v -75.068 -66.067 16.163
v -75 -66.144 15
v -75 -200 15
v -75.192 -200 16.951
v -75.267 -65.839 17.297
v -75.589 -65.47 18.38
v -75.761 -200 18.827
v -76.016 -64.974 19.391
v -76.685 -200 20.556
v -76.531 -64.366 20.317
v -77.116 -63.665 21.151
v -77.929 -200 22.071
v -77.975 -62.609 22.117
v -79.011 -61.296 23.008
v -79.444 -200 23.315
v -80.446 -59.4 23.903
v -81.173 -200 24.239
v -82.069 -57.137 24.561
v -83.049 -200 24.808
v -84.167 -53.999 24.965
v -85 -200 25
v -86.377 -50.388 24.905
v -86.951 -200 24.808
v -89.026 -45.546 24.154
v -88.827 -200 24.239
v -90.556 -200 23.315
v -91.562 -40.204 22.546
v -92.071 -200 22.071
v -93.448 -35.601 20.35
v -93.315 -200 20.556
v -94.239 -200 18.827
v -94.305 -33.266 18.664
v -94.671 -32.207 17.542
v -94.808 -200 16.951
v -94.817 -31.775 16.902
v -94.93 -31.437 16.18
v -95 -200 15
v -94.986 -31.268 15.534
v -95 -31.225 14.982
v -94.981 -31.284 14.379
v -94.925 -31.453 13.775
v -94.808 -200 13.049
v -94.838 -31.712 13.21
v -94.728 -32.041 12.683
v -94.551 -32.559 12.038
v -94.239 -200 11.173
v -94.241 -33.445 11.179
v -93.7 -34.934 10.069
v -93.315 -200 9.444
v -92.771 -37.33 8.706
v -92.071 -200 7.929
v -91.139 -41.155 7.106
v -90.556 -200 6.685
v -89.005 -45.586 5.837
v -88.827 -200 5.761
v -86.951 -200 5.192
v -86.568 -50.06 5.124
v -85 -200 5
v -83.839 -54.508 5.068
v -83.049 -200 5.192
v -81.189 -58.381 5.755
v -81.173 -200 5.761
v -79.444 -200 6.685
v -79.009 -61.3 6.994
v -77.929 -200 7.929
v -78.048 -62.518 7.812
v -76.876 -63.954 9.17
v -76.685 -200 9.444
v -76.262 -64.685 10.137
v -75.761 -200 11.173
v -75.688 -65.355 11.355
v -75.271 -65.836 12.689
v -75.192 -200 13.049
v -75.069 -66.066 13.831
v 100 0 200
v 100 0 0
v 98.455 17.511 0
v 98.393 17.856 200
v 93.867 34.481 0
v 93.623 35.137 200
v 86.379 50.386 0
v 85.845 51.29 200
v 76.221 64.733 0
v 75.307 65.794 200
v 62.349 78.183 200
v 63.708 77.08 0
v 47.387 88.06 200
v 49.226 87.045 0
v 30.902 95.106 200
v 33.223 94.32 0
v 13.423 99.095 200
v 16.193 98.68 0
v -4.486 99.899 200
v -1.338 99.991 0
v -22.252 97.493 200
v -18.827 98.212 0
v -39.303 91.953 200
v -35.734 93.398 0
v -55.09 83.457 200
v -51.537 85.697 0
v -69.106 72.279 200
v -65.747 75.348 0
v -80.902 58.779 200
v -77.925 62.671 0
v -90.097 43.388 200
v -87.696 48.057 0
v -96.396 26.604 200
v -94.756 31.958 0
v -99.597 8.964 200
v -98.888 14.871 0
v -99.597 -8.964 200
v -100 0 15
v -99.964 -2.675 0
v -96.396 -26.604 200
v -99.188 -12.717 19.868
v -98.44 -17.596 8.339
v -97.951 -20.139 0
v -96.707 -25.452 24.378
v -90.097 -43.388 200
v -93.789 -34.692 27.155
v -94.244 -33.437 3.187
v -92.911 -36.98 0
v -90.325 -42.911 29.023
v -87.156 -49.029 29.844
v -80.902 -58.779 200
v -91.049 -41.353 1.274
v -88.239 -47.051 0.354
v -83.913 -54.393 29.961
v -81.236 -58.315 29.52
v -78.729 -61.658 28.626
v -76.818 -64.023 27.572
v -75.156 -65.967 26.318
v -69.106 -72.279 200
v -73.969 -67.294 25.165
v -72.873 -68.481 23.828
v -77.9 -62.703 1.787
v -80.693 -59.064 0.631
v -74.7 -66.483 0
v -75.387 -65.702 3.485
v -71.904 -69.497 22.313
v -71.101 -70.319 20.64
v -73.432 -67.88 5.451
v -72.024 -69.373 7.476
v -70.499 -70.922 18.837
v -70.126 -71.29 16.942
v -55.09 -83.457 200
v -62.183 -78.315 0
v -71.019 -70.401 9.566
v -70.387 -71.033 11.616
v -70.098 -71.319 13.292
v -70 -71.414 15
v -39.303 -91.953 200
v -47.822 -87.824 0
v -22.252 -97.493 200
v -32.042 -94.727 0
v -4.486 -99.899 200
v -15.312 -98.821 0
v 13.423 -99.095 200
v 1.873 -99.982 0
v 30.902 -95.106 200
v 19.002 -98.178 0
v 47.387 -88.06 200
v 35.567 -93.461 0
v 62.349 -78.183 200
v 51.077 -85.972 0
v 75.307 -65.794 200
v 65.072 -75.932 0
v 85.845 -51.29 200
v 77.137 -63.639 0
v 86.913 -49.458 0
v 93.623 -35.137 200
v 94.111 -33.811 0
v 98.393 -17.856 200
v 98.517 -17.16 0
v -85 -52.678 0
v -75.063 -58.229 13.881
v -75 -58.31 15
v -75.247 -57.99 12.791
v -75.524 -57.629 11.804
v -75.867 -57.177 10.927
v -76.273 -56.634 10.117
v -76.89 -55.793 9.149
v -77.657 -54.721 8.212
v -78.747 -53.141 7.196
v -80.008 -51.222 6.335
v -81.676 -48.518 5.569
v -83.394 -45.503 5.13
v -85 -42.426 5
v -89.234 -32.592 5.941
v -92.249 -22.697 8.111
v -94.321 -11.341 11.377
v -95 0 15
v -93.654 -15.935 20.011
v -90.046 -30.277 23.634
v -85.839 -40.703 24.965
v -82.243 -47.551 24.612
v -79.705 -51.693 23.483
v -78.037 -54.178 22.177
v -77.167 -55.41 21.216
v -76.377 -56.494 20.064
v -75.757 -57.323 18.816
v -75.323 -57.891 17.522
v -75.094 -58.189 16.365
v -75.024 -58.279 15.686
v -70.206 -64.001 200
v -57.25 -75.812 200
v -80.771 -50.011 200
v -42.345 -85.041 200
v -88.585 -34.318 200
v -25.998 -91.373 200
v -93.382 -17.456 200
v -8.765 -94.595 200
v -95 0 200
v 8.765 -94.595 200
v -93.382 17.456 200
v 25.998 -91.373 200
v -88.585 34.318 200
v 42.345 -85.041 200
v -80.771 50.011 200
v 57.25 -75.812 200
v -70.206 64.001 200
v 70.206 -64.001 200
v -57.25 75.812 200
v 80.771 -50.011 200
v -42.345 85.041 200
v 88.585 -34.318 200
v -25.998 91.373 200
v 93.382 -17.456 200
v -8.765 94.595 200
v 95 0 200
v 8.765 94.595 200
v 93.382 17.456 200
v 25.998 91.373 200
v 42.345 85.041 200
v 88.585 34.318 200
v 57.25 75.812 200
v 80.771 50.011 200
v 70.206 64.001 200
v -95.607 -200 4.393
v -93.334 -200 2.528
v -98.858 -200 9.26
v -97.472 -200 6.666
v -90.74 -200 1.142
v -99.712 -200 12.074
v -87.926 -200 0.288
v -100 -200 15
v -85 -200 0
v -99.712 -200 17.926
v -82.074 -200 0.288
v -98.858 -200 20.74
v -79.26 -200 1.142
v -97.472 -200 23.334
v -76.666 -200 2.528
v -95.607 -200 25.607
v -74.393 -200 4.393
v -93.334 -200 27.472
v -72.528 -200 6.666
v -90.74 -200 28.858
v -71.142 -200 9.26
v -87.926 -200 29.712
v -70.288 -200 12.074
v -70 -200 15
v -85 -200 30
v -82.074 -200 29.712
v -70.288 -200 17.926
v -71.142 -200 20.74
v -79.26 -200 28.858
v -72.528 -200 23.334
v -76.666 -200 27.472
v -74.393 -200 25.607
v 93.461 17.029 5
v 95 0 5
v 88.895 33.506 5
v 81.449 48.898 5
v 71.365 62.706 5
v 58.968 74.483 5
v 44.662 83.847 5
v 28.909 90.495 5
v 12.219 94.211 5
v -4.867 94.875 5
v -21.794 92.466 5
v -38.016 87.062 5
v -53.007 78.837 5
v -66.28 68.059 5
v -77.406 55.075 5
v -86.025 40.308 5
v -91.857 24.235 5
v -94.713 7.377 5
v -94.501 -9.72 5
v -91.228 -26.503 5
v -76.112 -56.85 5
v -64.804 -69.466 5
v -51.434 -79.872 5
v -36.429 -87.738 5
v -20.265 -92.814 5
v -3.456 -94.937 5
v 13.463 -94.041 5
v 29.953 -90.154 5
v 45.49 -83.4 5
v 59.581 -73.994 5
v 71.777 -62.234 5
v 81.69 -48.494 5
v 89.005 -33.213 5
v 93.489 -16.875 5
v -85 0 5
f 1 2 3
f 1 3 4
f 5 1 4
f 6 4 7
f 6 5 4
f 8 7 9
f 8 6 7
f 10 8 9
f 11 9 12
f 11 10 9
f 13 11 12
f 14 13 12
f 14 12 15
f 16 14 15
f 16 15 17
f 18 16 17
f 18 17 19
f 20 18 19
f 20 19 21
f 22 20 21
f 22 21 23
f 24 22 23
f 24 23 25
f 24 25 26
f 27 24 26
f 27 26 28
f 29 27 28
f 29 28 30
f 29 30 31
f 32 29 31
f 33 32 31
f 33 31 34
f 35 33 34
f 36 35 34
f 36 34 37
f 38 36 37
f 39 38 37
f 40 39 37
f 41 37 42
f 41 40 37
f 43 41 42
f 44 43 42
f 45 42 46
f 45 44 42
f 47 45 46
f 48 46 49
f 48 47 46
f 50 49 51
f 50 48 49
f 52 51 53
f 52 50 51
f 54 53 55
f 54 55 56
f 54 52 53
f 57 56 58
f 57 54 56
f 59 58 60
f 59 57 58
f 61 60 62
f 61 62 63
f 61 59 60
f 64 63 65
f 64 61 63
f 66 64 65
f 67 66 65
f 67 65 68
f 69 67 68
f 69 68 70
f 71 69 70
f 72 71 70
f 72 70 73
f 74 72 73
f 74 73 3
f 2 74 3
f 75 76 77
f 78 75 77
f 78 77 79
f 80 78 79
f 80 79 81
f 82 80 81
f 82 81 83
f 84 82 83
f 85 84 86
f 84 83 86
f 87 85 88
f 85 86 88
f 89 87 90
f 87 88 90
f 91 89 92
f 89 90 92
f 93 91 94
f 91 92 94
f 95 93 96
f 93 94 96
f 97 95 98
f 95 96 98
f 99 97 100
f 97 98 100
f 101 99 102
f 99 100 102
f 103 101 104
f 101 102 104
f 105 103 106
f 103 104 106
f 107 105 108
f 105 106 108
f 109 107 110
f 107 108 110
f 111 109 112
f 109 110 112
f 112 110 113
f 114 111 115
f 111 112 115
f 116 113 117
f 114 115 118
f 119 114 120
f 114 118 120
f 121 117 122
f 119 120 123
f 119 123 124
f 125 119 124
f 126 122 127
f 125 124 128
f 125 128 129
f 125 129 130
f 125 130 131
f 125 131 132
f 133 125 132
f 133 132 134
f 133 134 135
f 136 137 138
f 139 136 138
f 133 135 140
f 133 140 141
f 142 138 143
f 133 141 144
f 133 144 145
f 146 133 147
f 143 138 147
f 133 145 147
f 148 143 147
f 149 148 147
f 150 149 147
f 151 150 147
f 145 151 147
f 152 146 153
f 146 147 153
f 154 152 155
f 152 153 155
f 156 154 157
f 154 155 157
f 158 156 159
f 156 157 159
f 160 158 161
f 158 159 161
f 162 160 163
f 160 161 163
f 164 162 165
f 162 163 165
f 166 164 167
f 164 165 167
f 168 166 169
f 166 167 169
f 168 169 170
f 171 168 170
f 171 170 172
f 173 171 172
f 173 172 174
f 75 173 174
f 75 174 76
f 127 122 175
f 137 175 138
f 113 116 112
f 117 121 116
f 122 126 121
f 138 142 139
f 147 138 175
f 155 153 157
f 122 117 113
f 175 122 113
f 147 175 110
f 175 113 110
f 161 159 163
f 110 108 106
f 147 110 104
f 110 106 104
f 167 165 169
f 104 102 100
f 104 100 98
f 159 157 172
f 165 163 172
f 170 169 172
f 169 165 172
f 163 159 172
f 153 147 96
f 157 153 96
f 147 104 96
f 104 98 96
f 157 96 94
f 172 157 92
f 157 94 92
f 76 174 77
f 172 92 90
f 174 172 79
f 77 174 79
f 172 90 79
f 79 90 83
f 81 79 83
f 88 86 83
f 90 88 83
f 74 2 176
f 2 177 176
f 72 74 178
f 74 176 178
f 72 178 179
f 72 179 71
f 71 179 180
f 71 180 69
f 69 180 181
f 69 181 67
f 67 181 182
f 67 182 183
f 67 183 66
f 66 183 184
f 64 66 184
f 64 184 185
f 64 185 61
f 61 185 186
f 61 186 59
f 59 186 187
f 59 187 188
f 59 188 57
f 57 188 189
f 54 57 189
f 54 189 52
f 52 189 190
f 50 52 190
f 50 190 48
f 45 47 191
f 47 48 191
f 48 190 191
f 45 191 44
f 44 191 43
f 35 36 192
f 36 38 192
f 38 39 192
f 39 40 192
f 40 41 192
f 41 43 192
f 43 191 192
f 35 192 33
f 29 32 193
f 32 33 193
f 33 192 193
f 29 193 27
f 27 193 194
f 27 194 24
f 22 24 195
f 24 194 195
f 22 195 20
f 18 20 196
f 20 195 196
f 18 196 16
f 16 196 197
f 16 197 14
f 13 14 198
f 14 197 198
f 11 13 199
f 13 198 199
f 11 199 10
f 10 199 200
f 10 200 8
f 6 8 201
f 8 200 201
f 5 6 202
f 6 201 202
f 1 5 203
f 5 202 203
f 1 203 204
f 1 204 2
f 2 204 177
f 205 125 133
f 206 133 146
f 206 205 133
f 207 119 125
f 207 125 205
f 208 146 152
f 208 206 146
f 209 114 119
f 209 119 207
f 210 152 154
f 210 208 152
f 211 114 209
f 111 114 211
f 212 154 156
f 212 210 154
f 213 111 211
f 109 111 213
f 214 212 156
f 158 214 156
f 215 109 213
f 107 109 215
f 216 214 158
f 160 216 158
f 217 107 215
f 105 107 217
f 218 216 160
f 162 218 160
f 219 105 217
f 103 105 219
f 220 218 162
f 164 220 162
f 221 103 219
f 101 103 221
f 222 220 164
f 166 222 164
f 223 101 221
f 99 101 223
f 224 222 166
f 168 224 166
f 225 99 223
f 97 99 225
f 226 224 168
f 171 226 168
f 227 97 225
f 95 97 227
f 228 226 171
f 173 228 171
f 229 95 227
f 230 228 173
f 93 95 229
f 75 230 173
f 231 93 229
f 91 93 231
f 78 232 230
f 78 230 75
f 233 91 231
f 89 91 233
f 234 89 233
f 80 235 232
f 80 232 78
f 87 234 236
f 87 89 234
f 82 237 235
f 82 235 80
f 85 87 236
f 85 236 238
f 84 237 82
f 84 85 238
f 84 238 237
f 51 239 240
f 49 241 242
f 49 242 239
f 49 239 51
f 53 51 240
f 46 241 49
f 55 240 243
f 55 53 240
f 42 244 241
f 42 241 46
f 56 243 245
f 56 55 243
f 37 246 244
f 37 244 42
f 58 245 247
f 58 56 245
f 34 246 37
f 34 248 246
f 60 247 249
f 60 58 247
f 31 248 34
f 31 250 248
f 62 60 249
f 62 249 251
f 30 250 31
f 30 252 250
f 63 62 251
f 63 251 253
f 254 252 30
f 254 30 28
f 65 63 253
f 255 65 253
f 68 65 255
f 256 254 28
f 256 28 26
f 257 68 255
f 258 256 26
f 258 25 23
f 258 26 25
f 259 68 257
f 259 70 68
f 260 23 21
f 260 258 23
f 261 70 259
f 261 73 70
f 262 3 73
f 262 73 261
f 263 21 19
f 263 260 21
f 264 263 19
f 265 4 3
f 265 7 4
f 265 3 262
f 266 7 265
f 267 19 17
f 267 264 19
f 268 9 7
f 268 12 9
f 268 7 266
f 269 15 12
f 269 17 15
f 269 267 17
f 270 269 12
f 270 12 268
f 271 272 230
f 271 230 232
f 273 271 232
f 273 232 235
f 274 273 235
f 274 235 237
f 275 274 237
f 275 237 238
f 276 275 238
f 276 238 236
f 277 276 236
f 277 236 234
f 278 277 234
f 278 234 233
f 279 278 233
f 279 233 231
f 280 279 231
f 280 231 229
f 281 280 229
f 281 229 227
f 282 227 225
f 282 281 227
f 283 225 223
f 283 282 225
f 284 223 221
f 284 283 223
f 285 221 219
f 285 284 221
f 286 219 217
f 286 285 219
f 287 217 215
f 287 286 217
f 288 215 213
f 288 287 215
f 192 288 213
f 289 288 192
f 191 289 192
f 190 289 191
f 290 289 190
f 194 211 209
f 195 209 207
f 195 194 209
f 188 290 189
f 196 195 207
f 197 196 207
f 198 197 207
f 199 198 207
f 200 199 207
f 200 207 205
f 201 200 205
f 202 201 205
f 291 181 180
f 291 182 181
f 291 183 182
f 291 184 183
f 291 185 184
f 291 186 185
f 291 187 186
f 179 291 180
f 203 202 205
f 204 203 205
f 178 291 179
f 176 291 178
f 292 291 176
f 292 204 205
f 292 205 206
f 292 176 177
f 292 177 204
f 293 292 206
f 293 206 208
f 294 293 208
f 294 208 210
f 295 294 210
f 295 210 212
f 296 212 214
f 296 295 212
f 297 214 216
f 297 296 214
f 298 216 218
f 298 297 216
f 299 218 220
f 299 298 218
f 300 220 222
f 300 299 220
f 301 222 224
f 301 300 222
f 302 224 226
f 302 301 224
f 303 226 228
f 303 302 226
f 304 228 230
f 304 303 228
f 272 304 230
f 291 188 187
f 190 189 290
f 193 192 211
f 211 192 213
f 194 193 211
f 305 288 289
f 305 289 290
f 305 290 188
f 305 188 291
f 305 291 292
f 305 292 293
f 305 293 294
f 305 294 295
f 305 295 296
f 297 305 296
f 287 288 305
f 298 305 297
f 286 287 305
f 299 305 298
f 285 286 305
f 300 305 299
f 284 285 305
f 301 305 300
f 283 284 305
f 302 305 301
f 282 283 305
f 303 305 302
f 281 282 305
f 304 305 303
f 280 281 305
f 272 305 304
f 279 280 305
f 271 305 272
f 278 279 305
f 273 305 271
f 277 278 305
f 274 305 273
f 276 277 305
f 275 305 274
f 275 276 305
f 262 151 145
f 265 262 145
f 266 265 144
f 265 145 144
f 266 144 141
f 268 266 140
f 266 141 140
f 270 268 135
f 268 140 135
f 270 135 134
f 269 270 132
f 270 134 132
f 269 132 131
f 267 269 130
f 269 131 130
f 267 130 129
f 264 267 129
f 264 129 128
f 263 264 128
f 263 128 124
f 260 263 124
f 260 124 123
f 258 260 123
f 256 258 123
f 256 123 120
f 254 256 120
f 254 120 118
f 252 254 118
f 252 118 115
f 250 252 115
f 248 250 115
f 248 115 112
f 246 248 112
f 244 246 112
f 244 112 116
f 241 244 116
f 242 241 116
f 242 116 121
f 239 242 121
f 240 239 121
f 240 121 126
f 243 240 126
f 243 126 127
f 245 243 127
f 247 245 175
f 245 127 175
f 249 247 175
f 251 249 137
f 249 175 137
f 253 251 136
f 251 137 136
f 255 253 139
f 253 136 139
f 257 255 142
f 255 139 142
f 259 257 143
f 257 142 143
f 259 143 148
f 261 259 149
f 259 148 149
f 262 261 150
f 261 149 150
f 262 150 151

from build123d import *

# Parameters (mm, degrees)
F0_R     = 15
F0_R_2   = 10
F1_DEPTH = 200
F3_W     = 572.0791816711
F3_H     = 457.3649317026
F3_R     = 100
F4_DEPTH = 60
F6_R     = 95
F7_DEPTH = 5
F6_R_2   = 100
F8_DEPTH = 200
F9_D     = 20
F9_DEPTH = 200.0010001


with BuildPart() as f1:
    # F0 (on Front) → F1 (new body)
    with BuildSketch(Plane.XZ):
        with Locations((-85, 15)):
            Circle(F0_R)
        with Locations((-85, 15)):
            Circle(F0_R_2, mode=Mode.SUBTRACT)
    extrude(amount=F1_DEPTH)

    # F3 (on offset) → F4 (intersect)
    with BuildSketch(Plane.XY.offset(-20)):
        with Locations((-14.546662569, -7.4936076999)):
            Rectangle(F3_W, F3_H)
        Circle(F3_R, mode=Mode.SUBTRACT)
    extrude(amount=F4_DEPTH, mode=Mode.INTERSECT)



with BuildPart() as f7:
    # F6 (on Top) → F7 (new body)
    with BuildSketch(Plane.XY):
        Circle(F6_R)
    extrude(amount=F7_DEPTH)


with BuildPart() as f1_1:
    add(f1.part)

    add(f7.part)  # F8 merges F7
    # F6 (on Top) → F8 (join)
    with BuildSketch(Plane.XY):
        Circle(F6_R_2)
        Circle(F6_R, mode=Mode.SUBTRACT)
    extrude(amount=F8_DEPTH)

    # F9 (through all, one way)
    with BuildSketch(Plane(origin=(0, 0, 0), x_dir=(1, 0, 0), z_dir=(0, 1, 0))):
        with Locations((-85, -15)):
            Circle(F9_D / 2)
    extrude(amount=-F9_DEPTH, mode=Mode.SUBTRACT)


solid = f1_1.part
